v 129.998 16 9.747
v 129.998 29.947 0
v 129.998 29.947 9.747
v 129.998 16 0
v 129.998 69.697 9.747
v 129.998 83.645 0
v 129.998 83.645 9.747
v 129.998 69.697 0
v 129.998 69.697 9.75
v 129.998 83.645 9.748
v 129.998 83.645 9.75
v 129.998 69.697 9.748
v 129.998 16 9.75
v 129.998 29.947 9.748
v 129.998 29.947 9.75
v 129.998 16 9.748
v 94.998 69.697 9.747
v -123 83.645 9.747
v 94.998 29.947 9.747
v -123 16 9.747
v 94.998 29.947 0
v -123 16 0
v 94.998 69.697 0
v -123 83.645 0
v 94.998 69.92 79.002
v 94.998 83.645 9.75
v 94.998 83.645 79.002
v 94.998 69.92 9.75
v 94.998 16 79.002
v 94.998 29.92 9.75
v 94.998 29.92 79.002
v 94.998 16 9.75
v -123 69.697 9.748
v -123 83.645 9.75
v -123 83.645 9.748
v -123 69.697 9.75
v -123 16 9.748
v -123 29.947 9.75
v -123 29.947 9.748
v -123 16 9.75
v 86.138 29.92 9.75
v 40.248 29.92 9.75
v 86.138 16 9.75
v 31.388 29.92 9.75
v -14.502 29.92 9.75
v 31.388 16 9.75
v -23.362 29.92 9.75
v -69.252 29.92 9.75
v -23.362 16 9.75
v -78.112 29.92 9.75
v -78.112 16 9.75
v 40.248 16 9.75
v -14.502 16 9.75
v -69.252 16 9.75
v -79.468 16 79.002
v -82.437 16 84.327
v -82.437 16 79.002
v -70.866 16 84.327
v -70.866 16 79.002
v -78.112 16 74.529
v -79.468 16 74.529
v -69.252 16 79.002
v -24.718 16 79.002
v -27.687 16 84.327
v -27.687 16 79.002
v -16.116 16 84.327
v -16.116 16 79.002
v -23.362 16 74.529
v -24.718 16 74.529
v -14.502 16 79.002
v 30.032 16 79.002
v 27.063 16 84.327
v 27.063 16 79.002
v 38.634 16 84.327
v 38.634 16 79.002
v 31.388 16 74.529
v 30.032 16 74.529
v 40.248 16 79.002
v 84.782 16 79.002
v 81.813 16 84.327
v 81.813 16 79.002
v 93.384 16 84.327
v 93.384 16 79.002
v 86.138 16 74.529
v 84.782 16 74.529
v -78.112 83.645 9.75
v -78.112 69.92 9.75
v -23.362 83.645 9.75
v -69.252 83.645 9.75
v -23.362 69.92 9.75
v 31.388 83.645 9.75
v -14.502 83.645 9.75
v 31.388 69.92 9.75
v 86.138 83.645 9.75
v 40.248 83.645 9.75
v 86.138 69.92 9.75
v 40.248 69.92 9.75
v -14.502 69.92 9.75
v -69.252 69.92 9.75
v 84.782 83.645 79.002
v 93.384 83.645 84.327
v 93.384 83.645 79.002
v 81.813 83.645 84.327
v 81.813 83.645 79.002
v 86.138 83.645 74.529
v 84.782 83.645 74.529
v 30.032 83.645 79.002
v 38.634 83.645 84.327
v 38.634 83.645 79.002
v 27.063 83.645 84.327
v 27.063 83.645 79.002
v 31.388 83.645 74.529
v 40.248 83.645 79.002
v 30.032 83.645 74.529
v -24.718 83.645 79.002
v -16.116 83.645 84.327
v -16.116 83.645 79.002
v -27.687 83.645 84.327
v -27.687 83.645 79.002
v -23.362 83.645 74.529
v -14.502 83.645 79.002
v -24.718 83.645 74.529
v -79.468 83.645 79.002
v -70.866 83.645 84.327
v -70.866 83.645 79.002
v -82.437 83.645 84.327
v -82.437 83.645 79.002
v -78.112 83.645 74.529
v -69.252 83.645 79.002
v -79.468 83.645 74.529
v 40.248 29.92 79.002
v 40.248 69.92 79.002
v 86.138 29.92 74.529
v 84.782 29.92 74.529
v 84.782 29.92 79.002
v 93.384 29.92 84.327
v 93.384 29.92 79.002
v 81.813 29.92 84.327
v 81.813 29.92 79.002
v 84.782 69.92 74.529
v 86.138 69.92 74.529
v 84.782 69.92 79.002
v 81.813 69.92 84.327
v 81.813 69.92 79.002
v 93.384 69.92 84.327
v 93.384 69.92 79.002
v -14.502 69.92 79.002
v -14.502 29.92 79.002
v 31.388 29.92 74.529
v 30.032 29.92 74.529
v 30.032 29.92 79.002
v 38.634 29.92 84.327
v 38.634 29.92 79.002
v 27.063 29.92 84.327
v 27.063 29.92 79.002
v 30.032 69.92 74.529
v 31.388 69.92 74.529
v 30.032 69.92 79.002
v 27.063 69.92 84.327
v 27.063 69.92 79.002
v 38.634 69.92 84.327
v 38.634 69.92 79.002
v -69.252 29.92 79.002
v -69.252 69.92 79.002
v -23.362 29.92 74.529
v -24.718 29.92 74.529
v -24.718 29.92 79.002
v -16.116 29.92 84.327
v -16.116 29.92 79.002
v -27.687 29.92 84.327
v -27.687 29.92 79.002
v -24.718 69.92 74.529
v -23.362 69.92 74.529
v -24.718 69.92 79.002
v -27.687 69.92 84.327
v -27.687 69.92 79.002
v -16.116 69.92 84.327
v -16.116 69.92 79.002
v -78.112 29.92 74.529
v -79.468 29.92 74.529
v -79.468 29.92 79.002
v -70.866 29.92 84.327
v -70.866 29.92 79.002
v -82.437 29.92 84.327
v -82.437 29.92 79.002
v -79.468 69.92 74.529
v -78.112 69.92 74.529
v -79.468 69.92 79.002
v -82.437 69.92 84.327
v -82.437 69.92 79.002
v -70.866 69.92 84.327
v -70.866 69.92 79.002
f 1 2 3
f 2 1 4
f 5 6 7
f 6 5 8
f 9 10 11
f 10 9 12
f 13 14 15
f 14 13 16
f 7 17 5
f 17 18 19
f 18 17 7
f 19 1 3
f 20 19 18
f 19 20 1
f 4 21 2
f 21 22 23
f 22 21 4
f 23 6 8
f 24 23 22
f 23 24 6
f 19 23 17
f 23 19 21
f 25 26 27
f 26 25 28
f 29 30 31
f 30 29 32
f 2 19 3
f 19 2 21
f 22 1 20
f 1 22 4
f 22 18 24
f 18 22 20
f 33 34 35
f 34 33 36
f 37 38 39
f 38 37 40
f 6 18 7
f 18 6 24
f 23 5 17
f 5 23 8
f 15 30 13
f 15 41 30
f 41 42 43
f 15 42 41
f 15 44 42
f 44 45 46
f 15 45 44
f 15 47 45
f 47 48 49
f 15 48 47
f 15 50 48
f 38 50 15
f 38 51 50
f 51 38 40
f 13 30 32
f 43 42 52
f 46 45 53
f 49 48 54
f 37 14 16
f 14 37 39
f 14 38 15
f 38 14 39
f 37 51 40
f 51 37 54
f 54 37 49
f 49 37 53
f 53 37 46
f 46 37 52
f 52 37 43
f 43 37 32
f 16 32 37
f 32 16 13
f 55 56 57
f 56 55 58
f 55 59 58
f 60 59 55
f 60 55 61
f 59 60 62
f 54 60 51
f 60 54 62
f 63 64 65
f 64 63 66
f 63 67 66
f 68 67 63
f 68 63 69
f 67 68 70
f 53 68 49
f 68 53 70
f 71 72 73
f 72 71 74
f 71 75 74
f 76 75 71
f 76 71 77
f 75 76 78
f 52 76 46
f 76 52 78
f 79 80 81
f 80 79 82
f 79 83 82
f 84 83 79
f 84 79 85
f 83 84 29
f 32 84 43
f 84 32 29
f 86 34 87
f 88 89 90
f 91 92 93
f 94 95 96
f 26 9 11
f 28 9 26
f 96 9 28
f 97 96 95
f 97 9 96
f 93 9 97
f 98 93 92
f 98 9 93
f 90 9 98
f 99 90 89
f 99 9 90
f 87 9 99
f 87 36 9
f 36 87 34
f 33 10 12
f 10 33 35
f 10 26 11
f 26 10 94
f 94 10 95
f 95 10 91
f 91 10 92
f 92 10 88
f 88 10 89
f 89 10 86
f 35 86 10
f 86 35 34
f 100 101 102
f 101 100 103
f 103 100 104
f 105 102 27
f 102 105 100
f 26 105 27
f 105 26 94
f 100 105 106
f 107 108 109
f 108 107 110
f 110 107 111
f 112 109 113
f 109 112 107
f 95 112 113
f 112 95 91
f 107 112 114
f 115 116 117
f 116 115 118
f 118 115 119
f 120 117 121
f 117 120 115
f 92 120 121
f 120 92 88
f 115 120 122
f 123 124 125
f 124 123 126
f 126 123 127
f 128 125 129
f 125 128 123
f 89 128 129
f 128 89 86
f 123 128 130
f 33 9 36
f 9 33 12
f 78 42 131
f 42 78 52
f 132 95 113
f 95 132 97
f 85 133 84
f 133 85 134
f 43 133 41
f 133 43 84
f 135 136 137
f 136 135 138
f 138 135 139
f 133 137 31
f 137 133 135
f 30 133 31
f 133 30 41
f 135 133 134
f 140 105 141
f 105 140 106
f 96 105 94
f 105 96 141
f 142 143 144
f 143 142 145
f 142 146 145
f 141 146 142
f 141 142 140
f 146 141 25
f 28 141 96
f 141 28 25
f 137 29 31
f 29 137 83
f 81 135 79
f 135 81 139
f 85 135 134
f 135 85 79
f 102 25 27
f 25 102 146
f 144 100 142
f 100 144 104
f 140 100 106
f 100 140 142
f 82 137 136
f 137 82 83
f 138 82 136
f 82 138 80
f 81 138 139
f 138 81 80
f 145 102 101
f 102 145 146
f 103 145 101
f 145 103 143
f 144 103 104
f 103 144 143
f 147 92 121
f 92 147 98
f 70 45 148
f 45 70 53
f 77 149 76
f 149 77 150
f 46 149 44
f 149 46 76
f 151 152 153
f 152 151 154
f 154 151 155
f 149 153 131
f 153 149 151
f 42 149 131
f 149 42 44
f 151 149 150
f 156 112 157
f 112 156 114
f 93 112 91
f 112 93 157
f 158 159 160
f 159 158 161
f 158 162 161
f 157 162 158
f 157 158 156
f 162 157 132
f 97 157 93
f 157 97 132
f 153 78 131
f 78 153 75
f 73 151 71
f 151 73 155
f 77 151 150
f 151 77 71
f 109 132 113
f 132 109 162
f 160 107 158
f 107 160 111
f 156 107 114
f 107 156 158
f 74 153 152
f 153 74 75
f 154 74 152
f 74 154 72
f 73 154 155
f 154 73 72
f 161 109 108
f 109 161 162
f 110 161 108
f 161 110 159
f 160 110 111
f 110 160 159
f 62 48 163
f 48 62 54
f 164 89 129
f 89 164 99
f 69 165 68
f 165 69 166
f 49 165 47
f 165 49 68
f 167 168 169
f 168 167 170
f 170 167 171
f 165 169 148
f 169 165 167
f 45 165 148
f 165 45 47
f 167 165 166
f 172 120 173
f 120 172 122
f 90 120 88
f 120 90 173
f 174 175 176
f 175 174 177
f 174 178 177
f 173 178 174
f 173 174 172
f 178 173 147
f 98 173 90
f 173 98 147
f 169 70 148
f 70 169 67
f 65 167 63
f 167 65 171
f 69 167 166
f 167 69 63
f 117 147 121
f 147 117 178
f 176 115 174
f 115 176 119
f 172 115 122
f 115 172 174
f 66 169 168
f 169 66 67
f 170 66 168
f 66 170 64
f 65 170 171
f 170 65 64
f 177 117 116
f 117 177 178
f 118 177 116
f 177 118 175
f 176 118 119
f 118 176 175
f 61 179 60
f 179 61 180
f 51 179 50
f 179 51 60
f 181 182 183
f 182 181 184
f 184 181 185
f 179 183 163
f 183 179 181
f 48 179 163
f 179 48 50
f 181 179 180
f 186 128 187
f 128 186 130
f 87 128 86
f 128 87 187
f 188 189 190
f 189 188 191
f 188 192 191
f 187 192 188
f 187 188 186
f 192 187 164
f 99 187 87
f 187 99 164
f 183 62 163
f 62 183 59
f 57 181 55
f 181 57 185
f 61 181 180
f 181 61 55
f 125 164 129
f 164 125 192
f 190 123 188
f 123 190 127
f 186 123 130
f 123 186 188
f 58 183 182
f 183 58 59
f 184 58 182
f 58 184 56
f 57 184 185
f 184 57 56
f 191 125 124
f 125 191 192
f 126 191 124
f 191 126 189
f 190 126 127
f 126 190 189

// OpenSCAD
// Parameterized version of top_rect_cubes_simplified_jay.scad
// Parameters (edit these):
//   width:    overall X width (right side shifts)
//   length:   overall Y depth (scales from front face)
//   arm_gap:  gap in Y between the two arms (overrides the scaled gap)
//
// Knob-centering behavior:
// - Features in the mid-band (the small "knobs" on the large planes) stay centered
//   between the arms when arm_gap changes (they shift by half the gap delta).
//
// Identity check (matches the source geometry exactly) when:
//   width  = 252.997994;
//   length = 59.644998;
//   arm_gap = 31.750000;

width   = 252.997994;
length  = 59.644998;
arm_gap = 39.750000;

// --- Reference constants (from source file) ---
_x_min      = -123.000008;
_x_split    = 94.997986;
_width_orig = 252.997994;

// Y reference landmarks (original)
// front arm ends at _y_front_end, back arm starts at _y_back_start.
// mid-band corresponds to the small "knobs" on the large planes.
_y_min           = 15.999999;
_y_front_end     = 29.946999;
_y_mid_band_start = 42.919998;
_y_mid_band_end   = 48.919998;
_y_back_start    = 61.696999;
_y_max           = 75.644997;
_length_orig     = 59.644998;
_arm_gap_orig    = 31.750000;

// --- Mapping functions ---
// X: shift the right side to hit the desired width
function map_x(x) = (x < _x_split) ? x : (x + (width - _width_orig));

// Y: first scale overall length from the front face, then shift the back-arm region
// to achieve the requested arm_gap. Mid-band features shift by half the gap delta.
function scale_y(y) = _y_min + (y - _y_min) * (length / _length_orig);

function _front_end_s() = scale_y(_y_front_end);
function _back_start_s() = scale_y(_y_back_start);
function _mid_start_s() = scale_y(_y_mid_band_start);
function _mid_end_s()   = scale_y(_y_mid_band_end);

function _gap_scaled() = _back_start_s() - _front_end_s();
function _gap_delta()  = arm_gap - _gap_scaled();

function map_y(y) =
  let(
    y0 = scale_y(y),
    bs = _back_start_s(),
    ms = _mid_start_s(),
    me = _mid_end_s(),
    dg = _gap_delta()
  )
  (y0 < bs)
    ? ((y0 >= ms && y0 <= me) ? (y0 + dg/2) : y0)
    : (y0 + dg);

module rect_prism_m(x1,y1,x2,y2,z0,h){
  translate([map_x(x1), map_y(y1), z0])
    cube([map_x(x2)-map_x(x1), map_y(y2)-map_y(y1), h], center=false);
}


// --- Section controls ---
// Four section templates exist (0..3). Each template is a left-to-right slice of the design
// and contains *two towers* (front + back) plus its mid-band features.
//
// To remove/reorder/repeat sections, edit these:
section_sequence = [0,1,2,3,4];           // templates per slot: 0=base-only, 1=rightmost towers, ..., 4=leftmost towers
section_show     = [true,true,true,true,true]; // per-slot visibility (same length as section_sequence)

_section_centers = [-73.682014, -18.932015, 35.817985, 90.567986];
_section_pitch   = 54.750000;

function slot_center(slot) = _section_centers[0] + slot*_section_pitch;
function template_center(idx) = _section_centers[idx];

module section_by_index(idx) {
  if (idx==0) section_0();
  else if (idx==1) section_1();
  else if (idx==2) section_2();
  else if (idx==3) section_3();
  else assert(false, str("Invalid section index: ", idx));
}

module place_section(slot, idx) {
  // Translate template idx into slot position so spacing stays consistent
  translate([slot_center(slot) - template_center(idx), 0, 0]) section_by_index(idx);
}

module sections() {
  // Base segments are defined by the right edges of the tower pairs, plus the overall base bounds.
  // Sections (slots) run from the RIGHT side toward the LEFT:
  //   slot 0: base_x_max -> right edge of rightmost towers (no towers by default)
  //   slot 1: rightmost tower edge -> next tower edge
  //   slot 2: next -> next
  //   slot 3: next -> next
  //   slot 4: leftmost tower edge -> base_x_min
  //
  // Template ids (section_sequence):
  //   0 = base-only (no towers)
  //   1 = section_3 (rightmost towers)
  //   2 = section_2
  //   3 = section_1
  //   4 = section_0 (leftmost towers)

  for (slot = [0 : len(section_sequence)-1]) {
    if (slot < len(section_show) && section_show[slot]) {
      // Base under this section
      base_segment_for_slot(slot);

      // Section content (towers/knobs/etc) for this slot
      place_template(section_sequence[slot]);
    }
  }
}

// --- Base segment clipping (per slot) ---
_base_x_max_orig = 129.997986;
_base_x_min_orig = -123.000008;
// Right edges of each tower-pair (original coordinates, before map_x())
_tower_right_edges_orig = [94.997986, 40.247986, -14.502014, -69.252014];

function slot_x_hi_orig(slot) =
  (slot == 0) ? _base_x_max_orig :
  (slot == 1) ? _tower_right_edges_orig[0] :
  (slot == 2) ? _tower_right_edges_orig[1] :
  (slot == 3) ? _tower_right_edges_orig[2] :
  (slot == 4) ? _tower_right_edges_orig[3] :
  _base_x_min_orig;

function slot_x_lo_orig(slot) =
  (slot == 0) ? _tower_right_edges_orig[0] :
  (slot == 1) ? _tower_right_edges_orig[1] :
  (slot == 2) ? _tower_right_edges_orig[2] :
  (slot == 3) ? _tower_right_edges_orig[3] :
  (slot == 4) ? _base_x_min_orig :
  _base_x_min_orig;

module base_segment_for_slot(slot) {
  // Clip the common base planes into the slot's X-range.
  // Use mapped X coordinates so width parameterization stays consistent.
  x_hi = map_x(slot_x_hi_orig(slot));
  x_lo = map_x(slot_x_lo_orig(slot));
  x0 = min(x_lo, x_hi);
  x1 = max(x_lo, x_hi);
  w  = max(0.001, x1 - x0);

  intersection() {
    base_planes();
    // Big clip box in Y/Z; base is near y~[16..76], z~[0..~20], so this safely covers it.
    translate([x0, -1000, -1000]) cube([w, 2000, 2000], center=false);
  }
}

// --- Template dispatcher ---
module place_template(tid) {
  if (tid == 0) {
    // base-only
  } else if (tid == 1) {
    section_3();
  } else if (tid == 2) {
    section_2();
  } else if (tid == 3) {
    section_1();
  } else if (tid == 4) {
    section_0();
  } else {
    // Unknown template id: render nothing
  }
}


// --- Base planes (common to all sections) ---
module base_planes() {
  union() {
    rect_prism_m(94.997986,15.999999,129.997986,29.946999,0.000000,9.747);
    rect_prism_m(-123.000008,15.999999,94.997986,75.644997,0.000000,9.747);
    rect_prism_m(94.997986,61.696999,129.997986,75.644997,0.000000,9.747);
    rect_prism_m(-123.000008,15.999999,129.997986,29.946999,9.748000,0.002);
    rect_prism_m(-123.000008,61.696999,129.997986,75.644997,9.748000,0.002);
  }
}

module section_0() {
  union() {
    //rect_prism_m(-119.196615,42.919998,-113.073431,48.919998,9.748000,0.002);
   // rect_prism_m(-120.437410,42.919998,-114.314075,48.919998,9.750000,12.195);
    //rect_prism_m(-118.738005,42.919998,-115.676272,48.919998,21.945000,1.197);
    rect_prism_m(-78.112015,15.999999,-69.252014,29.919998,9.750000,64.779);
    rect_prism_m(-78.112015,61.919998,-69.252014,75.644997,9.750000,64.779);
    rect_prism_m(-79.467536,15.999999,-69.252014,29.919998,74.529000,4.4726);
    rect_prism_m(-79.467536,61.919998,-69.252014,75.644997,74.529000,4.4726);
    rect_prism_m(-82.437039,15.999999,-70.865755,29.919998,79.001600,5.3254);
    rect_prism_m(-82.437039,61.919998,-70.865755,75.644997,79.001600,5.3254);
  }
}

module section_1() {
  union() {
   // rect_prism_m(-64.446630,42.919998,-58.323427,48.919998,9.748000,0.002);
   // rect_prism_m(-65.687418,42.919998,-59.564071,48.919998,9.750000,12.195);
   // rect_prism_m(-63.988003,42.919998,-60.926268,48.919998,21.945000,1.197);
    rect_prism_m(-23.362015,15.999999,-14.502014,29.919998,9.750000,64.779);
    rect_prism_m(-23.362015,61.919998,-14.502014,75.644997,9.750000,64.779);
    rect_prism_m(-24.717536,15.999999,-14.502014,29.919998,74.529000,4.4726);
    rect_prism_m(-24.717536,61.919998,-14.502014,75.644997,74.529000,4.4726);
    rect_prism_m(-27.687036,15.999999,-16.115755,29.919998,79.001600,5.3254);
    rect_prism_m(-27.687036,61.919998,-16.115755,75.644997,79.001600,5.3254);
  }
}

module section_2() {
  union() {
   // rect_prism_m(-9.696628,42.919998,-3.573428,48.919998,9.748000,0.002);
   // rect_prism_m(-10.937418,42.919998,-4.814072,48.919998,9.750000,12.195);
   // rect_prism_m(-9.238005,42.919998,-6.176269,48.919998,21.945000,1.197);
    rect_prism_m(31.387985,15.999999,40.247986,29.919998,9.750000,64.779);
    rect_prism_m(31.387985,61.919998,40.247986,75.644997,9.750000,64.779);
    rect_prism_m(30.032464,15.999999,40.247986,29.919998,74.529000,4.4726);
    rect_prism_m(30.032464,61.919998,40.247986,75.644997,74.529000,4.4726);
    rect_prism_m(27.062964,15.999999,38.634246,29.919998,79.001600,5.3254);
    rect_prism_m(27.062964,61.919998,38.634246,75.644997,79.001600,5.3254);
  }
}

module section_3() {
  union() {
   // rect_prism_m(45.053381,42.919998,51.176573,48.919998,9.748000,0.002);
    //rect_prism_m(43.812582,42.919998,49.935932,48.919998,9.750000,12.195);
   // rect_prism_m(45.511995,42.919998,48.573739,48.919998,21.945000,1.197);
    rect_prism_m(86.137985,15.999999,94.997986,29.919998,9.750000,64.779);
    rect_prism_m(86.137985,61.919998,94.997986,75.644997,9.750000,64.779);
    rect_prism_m(84.782464,15.999999,94.997986,29.919998,74.529000,4.4726);
    rect_prism_m(84.782464,61.919998,94.997986,75.644997,74.529000,4.4726);
    rect_prism_m(81.812961,15.999999,93.384242,29.919998,79.001600,5.3254);
    rect_prism_m(81.812961,61.919998,93.384242,75.644997,79.001600,5.3254);
  }
}

// --- Final assembly ---
module top() {
  union() {
    //base_planes();
    sections();
  }
}

top();
